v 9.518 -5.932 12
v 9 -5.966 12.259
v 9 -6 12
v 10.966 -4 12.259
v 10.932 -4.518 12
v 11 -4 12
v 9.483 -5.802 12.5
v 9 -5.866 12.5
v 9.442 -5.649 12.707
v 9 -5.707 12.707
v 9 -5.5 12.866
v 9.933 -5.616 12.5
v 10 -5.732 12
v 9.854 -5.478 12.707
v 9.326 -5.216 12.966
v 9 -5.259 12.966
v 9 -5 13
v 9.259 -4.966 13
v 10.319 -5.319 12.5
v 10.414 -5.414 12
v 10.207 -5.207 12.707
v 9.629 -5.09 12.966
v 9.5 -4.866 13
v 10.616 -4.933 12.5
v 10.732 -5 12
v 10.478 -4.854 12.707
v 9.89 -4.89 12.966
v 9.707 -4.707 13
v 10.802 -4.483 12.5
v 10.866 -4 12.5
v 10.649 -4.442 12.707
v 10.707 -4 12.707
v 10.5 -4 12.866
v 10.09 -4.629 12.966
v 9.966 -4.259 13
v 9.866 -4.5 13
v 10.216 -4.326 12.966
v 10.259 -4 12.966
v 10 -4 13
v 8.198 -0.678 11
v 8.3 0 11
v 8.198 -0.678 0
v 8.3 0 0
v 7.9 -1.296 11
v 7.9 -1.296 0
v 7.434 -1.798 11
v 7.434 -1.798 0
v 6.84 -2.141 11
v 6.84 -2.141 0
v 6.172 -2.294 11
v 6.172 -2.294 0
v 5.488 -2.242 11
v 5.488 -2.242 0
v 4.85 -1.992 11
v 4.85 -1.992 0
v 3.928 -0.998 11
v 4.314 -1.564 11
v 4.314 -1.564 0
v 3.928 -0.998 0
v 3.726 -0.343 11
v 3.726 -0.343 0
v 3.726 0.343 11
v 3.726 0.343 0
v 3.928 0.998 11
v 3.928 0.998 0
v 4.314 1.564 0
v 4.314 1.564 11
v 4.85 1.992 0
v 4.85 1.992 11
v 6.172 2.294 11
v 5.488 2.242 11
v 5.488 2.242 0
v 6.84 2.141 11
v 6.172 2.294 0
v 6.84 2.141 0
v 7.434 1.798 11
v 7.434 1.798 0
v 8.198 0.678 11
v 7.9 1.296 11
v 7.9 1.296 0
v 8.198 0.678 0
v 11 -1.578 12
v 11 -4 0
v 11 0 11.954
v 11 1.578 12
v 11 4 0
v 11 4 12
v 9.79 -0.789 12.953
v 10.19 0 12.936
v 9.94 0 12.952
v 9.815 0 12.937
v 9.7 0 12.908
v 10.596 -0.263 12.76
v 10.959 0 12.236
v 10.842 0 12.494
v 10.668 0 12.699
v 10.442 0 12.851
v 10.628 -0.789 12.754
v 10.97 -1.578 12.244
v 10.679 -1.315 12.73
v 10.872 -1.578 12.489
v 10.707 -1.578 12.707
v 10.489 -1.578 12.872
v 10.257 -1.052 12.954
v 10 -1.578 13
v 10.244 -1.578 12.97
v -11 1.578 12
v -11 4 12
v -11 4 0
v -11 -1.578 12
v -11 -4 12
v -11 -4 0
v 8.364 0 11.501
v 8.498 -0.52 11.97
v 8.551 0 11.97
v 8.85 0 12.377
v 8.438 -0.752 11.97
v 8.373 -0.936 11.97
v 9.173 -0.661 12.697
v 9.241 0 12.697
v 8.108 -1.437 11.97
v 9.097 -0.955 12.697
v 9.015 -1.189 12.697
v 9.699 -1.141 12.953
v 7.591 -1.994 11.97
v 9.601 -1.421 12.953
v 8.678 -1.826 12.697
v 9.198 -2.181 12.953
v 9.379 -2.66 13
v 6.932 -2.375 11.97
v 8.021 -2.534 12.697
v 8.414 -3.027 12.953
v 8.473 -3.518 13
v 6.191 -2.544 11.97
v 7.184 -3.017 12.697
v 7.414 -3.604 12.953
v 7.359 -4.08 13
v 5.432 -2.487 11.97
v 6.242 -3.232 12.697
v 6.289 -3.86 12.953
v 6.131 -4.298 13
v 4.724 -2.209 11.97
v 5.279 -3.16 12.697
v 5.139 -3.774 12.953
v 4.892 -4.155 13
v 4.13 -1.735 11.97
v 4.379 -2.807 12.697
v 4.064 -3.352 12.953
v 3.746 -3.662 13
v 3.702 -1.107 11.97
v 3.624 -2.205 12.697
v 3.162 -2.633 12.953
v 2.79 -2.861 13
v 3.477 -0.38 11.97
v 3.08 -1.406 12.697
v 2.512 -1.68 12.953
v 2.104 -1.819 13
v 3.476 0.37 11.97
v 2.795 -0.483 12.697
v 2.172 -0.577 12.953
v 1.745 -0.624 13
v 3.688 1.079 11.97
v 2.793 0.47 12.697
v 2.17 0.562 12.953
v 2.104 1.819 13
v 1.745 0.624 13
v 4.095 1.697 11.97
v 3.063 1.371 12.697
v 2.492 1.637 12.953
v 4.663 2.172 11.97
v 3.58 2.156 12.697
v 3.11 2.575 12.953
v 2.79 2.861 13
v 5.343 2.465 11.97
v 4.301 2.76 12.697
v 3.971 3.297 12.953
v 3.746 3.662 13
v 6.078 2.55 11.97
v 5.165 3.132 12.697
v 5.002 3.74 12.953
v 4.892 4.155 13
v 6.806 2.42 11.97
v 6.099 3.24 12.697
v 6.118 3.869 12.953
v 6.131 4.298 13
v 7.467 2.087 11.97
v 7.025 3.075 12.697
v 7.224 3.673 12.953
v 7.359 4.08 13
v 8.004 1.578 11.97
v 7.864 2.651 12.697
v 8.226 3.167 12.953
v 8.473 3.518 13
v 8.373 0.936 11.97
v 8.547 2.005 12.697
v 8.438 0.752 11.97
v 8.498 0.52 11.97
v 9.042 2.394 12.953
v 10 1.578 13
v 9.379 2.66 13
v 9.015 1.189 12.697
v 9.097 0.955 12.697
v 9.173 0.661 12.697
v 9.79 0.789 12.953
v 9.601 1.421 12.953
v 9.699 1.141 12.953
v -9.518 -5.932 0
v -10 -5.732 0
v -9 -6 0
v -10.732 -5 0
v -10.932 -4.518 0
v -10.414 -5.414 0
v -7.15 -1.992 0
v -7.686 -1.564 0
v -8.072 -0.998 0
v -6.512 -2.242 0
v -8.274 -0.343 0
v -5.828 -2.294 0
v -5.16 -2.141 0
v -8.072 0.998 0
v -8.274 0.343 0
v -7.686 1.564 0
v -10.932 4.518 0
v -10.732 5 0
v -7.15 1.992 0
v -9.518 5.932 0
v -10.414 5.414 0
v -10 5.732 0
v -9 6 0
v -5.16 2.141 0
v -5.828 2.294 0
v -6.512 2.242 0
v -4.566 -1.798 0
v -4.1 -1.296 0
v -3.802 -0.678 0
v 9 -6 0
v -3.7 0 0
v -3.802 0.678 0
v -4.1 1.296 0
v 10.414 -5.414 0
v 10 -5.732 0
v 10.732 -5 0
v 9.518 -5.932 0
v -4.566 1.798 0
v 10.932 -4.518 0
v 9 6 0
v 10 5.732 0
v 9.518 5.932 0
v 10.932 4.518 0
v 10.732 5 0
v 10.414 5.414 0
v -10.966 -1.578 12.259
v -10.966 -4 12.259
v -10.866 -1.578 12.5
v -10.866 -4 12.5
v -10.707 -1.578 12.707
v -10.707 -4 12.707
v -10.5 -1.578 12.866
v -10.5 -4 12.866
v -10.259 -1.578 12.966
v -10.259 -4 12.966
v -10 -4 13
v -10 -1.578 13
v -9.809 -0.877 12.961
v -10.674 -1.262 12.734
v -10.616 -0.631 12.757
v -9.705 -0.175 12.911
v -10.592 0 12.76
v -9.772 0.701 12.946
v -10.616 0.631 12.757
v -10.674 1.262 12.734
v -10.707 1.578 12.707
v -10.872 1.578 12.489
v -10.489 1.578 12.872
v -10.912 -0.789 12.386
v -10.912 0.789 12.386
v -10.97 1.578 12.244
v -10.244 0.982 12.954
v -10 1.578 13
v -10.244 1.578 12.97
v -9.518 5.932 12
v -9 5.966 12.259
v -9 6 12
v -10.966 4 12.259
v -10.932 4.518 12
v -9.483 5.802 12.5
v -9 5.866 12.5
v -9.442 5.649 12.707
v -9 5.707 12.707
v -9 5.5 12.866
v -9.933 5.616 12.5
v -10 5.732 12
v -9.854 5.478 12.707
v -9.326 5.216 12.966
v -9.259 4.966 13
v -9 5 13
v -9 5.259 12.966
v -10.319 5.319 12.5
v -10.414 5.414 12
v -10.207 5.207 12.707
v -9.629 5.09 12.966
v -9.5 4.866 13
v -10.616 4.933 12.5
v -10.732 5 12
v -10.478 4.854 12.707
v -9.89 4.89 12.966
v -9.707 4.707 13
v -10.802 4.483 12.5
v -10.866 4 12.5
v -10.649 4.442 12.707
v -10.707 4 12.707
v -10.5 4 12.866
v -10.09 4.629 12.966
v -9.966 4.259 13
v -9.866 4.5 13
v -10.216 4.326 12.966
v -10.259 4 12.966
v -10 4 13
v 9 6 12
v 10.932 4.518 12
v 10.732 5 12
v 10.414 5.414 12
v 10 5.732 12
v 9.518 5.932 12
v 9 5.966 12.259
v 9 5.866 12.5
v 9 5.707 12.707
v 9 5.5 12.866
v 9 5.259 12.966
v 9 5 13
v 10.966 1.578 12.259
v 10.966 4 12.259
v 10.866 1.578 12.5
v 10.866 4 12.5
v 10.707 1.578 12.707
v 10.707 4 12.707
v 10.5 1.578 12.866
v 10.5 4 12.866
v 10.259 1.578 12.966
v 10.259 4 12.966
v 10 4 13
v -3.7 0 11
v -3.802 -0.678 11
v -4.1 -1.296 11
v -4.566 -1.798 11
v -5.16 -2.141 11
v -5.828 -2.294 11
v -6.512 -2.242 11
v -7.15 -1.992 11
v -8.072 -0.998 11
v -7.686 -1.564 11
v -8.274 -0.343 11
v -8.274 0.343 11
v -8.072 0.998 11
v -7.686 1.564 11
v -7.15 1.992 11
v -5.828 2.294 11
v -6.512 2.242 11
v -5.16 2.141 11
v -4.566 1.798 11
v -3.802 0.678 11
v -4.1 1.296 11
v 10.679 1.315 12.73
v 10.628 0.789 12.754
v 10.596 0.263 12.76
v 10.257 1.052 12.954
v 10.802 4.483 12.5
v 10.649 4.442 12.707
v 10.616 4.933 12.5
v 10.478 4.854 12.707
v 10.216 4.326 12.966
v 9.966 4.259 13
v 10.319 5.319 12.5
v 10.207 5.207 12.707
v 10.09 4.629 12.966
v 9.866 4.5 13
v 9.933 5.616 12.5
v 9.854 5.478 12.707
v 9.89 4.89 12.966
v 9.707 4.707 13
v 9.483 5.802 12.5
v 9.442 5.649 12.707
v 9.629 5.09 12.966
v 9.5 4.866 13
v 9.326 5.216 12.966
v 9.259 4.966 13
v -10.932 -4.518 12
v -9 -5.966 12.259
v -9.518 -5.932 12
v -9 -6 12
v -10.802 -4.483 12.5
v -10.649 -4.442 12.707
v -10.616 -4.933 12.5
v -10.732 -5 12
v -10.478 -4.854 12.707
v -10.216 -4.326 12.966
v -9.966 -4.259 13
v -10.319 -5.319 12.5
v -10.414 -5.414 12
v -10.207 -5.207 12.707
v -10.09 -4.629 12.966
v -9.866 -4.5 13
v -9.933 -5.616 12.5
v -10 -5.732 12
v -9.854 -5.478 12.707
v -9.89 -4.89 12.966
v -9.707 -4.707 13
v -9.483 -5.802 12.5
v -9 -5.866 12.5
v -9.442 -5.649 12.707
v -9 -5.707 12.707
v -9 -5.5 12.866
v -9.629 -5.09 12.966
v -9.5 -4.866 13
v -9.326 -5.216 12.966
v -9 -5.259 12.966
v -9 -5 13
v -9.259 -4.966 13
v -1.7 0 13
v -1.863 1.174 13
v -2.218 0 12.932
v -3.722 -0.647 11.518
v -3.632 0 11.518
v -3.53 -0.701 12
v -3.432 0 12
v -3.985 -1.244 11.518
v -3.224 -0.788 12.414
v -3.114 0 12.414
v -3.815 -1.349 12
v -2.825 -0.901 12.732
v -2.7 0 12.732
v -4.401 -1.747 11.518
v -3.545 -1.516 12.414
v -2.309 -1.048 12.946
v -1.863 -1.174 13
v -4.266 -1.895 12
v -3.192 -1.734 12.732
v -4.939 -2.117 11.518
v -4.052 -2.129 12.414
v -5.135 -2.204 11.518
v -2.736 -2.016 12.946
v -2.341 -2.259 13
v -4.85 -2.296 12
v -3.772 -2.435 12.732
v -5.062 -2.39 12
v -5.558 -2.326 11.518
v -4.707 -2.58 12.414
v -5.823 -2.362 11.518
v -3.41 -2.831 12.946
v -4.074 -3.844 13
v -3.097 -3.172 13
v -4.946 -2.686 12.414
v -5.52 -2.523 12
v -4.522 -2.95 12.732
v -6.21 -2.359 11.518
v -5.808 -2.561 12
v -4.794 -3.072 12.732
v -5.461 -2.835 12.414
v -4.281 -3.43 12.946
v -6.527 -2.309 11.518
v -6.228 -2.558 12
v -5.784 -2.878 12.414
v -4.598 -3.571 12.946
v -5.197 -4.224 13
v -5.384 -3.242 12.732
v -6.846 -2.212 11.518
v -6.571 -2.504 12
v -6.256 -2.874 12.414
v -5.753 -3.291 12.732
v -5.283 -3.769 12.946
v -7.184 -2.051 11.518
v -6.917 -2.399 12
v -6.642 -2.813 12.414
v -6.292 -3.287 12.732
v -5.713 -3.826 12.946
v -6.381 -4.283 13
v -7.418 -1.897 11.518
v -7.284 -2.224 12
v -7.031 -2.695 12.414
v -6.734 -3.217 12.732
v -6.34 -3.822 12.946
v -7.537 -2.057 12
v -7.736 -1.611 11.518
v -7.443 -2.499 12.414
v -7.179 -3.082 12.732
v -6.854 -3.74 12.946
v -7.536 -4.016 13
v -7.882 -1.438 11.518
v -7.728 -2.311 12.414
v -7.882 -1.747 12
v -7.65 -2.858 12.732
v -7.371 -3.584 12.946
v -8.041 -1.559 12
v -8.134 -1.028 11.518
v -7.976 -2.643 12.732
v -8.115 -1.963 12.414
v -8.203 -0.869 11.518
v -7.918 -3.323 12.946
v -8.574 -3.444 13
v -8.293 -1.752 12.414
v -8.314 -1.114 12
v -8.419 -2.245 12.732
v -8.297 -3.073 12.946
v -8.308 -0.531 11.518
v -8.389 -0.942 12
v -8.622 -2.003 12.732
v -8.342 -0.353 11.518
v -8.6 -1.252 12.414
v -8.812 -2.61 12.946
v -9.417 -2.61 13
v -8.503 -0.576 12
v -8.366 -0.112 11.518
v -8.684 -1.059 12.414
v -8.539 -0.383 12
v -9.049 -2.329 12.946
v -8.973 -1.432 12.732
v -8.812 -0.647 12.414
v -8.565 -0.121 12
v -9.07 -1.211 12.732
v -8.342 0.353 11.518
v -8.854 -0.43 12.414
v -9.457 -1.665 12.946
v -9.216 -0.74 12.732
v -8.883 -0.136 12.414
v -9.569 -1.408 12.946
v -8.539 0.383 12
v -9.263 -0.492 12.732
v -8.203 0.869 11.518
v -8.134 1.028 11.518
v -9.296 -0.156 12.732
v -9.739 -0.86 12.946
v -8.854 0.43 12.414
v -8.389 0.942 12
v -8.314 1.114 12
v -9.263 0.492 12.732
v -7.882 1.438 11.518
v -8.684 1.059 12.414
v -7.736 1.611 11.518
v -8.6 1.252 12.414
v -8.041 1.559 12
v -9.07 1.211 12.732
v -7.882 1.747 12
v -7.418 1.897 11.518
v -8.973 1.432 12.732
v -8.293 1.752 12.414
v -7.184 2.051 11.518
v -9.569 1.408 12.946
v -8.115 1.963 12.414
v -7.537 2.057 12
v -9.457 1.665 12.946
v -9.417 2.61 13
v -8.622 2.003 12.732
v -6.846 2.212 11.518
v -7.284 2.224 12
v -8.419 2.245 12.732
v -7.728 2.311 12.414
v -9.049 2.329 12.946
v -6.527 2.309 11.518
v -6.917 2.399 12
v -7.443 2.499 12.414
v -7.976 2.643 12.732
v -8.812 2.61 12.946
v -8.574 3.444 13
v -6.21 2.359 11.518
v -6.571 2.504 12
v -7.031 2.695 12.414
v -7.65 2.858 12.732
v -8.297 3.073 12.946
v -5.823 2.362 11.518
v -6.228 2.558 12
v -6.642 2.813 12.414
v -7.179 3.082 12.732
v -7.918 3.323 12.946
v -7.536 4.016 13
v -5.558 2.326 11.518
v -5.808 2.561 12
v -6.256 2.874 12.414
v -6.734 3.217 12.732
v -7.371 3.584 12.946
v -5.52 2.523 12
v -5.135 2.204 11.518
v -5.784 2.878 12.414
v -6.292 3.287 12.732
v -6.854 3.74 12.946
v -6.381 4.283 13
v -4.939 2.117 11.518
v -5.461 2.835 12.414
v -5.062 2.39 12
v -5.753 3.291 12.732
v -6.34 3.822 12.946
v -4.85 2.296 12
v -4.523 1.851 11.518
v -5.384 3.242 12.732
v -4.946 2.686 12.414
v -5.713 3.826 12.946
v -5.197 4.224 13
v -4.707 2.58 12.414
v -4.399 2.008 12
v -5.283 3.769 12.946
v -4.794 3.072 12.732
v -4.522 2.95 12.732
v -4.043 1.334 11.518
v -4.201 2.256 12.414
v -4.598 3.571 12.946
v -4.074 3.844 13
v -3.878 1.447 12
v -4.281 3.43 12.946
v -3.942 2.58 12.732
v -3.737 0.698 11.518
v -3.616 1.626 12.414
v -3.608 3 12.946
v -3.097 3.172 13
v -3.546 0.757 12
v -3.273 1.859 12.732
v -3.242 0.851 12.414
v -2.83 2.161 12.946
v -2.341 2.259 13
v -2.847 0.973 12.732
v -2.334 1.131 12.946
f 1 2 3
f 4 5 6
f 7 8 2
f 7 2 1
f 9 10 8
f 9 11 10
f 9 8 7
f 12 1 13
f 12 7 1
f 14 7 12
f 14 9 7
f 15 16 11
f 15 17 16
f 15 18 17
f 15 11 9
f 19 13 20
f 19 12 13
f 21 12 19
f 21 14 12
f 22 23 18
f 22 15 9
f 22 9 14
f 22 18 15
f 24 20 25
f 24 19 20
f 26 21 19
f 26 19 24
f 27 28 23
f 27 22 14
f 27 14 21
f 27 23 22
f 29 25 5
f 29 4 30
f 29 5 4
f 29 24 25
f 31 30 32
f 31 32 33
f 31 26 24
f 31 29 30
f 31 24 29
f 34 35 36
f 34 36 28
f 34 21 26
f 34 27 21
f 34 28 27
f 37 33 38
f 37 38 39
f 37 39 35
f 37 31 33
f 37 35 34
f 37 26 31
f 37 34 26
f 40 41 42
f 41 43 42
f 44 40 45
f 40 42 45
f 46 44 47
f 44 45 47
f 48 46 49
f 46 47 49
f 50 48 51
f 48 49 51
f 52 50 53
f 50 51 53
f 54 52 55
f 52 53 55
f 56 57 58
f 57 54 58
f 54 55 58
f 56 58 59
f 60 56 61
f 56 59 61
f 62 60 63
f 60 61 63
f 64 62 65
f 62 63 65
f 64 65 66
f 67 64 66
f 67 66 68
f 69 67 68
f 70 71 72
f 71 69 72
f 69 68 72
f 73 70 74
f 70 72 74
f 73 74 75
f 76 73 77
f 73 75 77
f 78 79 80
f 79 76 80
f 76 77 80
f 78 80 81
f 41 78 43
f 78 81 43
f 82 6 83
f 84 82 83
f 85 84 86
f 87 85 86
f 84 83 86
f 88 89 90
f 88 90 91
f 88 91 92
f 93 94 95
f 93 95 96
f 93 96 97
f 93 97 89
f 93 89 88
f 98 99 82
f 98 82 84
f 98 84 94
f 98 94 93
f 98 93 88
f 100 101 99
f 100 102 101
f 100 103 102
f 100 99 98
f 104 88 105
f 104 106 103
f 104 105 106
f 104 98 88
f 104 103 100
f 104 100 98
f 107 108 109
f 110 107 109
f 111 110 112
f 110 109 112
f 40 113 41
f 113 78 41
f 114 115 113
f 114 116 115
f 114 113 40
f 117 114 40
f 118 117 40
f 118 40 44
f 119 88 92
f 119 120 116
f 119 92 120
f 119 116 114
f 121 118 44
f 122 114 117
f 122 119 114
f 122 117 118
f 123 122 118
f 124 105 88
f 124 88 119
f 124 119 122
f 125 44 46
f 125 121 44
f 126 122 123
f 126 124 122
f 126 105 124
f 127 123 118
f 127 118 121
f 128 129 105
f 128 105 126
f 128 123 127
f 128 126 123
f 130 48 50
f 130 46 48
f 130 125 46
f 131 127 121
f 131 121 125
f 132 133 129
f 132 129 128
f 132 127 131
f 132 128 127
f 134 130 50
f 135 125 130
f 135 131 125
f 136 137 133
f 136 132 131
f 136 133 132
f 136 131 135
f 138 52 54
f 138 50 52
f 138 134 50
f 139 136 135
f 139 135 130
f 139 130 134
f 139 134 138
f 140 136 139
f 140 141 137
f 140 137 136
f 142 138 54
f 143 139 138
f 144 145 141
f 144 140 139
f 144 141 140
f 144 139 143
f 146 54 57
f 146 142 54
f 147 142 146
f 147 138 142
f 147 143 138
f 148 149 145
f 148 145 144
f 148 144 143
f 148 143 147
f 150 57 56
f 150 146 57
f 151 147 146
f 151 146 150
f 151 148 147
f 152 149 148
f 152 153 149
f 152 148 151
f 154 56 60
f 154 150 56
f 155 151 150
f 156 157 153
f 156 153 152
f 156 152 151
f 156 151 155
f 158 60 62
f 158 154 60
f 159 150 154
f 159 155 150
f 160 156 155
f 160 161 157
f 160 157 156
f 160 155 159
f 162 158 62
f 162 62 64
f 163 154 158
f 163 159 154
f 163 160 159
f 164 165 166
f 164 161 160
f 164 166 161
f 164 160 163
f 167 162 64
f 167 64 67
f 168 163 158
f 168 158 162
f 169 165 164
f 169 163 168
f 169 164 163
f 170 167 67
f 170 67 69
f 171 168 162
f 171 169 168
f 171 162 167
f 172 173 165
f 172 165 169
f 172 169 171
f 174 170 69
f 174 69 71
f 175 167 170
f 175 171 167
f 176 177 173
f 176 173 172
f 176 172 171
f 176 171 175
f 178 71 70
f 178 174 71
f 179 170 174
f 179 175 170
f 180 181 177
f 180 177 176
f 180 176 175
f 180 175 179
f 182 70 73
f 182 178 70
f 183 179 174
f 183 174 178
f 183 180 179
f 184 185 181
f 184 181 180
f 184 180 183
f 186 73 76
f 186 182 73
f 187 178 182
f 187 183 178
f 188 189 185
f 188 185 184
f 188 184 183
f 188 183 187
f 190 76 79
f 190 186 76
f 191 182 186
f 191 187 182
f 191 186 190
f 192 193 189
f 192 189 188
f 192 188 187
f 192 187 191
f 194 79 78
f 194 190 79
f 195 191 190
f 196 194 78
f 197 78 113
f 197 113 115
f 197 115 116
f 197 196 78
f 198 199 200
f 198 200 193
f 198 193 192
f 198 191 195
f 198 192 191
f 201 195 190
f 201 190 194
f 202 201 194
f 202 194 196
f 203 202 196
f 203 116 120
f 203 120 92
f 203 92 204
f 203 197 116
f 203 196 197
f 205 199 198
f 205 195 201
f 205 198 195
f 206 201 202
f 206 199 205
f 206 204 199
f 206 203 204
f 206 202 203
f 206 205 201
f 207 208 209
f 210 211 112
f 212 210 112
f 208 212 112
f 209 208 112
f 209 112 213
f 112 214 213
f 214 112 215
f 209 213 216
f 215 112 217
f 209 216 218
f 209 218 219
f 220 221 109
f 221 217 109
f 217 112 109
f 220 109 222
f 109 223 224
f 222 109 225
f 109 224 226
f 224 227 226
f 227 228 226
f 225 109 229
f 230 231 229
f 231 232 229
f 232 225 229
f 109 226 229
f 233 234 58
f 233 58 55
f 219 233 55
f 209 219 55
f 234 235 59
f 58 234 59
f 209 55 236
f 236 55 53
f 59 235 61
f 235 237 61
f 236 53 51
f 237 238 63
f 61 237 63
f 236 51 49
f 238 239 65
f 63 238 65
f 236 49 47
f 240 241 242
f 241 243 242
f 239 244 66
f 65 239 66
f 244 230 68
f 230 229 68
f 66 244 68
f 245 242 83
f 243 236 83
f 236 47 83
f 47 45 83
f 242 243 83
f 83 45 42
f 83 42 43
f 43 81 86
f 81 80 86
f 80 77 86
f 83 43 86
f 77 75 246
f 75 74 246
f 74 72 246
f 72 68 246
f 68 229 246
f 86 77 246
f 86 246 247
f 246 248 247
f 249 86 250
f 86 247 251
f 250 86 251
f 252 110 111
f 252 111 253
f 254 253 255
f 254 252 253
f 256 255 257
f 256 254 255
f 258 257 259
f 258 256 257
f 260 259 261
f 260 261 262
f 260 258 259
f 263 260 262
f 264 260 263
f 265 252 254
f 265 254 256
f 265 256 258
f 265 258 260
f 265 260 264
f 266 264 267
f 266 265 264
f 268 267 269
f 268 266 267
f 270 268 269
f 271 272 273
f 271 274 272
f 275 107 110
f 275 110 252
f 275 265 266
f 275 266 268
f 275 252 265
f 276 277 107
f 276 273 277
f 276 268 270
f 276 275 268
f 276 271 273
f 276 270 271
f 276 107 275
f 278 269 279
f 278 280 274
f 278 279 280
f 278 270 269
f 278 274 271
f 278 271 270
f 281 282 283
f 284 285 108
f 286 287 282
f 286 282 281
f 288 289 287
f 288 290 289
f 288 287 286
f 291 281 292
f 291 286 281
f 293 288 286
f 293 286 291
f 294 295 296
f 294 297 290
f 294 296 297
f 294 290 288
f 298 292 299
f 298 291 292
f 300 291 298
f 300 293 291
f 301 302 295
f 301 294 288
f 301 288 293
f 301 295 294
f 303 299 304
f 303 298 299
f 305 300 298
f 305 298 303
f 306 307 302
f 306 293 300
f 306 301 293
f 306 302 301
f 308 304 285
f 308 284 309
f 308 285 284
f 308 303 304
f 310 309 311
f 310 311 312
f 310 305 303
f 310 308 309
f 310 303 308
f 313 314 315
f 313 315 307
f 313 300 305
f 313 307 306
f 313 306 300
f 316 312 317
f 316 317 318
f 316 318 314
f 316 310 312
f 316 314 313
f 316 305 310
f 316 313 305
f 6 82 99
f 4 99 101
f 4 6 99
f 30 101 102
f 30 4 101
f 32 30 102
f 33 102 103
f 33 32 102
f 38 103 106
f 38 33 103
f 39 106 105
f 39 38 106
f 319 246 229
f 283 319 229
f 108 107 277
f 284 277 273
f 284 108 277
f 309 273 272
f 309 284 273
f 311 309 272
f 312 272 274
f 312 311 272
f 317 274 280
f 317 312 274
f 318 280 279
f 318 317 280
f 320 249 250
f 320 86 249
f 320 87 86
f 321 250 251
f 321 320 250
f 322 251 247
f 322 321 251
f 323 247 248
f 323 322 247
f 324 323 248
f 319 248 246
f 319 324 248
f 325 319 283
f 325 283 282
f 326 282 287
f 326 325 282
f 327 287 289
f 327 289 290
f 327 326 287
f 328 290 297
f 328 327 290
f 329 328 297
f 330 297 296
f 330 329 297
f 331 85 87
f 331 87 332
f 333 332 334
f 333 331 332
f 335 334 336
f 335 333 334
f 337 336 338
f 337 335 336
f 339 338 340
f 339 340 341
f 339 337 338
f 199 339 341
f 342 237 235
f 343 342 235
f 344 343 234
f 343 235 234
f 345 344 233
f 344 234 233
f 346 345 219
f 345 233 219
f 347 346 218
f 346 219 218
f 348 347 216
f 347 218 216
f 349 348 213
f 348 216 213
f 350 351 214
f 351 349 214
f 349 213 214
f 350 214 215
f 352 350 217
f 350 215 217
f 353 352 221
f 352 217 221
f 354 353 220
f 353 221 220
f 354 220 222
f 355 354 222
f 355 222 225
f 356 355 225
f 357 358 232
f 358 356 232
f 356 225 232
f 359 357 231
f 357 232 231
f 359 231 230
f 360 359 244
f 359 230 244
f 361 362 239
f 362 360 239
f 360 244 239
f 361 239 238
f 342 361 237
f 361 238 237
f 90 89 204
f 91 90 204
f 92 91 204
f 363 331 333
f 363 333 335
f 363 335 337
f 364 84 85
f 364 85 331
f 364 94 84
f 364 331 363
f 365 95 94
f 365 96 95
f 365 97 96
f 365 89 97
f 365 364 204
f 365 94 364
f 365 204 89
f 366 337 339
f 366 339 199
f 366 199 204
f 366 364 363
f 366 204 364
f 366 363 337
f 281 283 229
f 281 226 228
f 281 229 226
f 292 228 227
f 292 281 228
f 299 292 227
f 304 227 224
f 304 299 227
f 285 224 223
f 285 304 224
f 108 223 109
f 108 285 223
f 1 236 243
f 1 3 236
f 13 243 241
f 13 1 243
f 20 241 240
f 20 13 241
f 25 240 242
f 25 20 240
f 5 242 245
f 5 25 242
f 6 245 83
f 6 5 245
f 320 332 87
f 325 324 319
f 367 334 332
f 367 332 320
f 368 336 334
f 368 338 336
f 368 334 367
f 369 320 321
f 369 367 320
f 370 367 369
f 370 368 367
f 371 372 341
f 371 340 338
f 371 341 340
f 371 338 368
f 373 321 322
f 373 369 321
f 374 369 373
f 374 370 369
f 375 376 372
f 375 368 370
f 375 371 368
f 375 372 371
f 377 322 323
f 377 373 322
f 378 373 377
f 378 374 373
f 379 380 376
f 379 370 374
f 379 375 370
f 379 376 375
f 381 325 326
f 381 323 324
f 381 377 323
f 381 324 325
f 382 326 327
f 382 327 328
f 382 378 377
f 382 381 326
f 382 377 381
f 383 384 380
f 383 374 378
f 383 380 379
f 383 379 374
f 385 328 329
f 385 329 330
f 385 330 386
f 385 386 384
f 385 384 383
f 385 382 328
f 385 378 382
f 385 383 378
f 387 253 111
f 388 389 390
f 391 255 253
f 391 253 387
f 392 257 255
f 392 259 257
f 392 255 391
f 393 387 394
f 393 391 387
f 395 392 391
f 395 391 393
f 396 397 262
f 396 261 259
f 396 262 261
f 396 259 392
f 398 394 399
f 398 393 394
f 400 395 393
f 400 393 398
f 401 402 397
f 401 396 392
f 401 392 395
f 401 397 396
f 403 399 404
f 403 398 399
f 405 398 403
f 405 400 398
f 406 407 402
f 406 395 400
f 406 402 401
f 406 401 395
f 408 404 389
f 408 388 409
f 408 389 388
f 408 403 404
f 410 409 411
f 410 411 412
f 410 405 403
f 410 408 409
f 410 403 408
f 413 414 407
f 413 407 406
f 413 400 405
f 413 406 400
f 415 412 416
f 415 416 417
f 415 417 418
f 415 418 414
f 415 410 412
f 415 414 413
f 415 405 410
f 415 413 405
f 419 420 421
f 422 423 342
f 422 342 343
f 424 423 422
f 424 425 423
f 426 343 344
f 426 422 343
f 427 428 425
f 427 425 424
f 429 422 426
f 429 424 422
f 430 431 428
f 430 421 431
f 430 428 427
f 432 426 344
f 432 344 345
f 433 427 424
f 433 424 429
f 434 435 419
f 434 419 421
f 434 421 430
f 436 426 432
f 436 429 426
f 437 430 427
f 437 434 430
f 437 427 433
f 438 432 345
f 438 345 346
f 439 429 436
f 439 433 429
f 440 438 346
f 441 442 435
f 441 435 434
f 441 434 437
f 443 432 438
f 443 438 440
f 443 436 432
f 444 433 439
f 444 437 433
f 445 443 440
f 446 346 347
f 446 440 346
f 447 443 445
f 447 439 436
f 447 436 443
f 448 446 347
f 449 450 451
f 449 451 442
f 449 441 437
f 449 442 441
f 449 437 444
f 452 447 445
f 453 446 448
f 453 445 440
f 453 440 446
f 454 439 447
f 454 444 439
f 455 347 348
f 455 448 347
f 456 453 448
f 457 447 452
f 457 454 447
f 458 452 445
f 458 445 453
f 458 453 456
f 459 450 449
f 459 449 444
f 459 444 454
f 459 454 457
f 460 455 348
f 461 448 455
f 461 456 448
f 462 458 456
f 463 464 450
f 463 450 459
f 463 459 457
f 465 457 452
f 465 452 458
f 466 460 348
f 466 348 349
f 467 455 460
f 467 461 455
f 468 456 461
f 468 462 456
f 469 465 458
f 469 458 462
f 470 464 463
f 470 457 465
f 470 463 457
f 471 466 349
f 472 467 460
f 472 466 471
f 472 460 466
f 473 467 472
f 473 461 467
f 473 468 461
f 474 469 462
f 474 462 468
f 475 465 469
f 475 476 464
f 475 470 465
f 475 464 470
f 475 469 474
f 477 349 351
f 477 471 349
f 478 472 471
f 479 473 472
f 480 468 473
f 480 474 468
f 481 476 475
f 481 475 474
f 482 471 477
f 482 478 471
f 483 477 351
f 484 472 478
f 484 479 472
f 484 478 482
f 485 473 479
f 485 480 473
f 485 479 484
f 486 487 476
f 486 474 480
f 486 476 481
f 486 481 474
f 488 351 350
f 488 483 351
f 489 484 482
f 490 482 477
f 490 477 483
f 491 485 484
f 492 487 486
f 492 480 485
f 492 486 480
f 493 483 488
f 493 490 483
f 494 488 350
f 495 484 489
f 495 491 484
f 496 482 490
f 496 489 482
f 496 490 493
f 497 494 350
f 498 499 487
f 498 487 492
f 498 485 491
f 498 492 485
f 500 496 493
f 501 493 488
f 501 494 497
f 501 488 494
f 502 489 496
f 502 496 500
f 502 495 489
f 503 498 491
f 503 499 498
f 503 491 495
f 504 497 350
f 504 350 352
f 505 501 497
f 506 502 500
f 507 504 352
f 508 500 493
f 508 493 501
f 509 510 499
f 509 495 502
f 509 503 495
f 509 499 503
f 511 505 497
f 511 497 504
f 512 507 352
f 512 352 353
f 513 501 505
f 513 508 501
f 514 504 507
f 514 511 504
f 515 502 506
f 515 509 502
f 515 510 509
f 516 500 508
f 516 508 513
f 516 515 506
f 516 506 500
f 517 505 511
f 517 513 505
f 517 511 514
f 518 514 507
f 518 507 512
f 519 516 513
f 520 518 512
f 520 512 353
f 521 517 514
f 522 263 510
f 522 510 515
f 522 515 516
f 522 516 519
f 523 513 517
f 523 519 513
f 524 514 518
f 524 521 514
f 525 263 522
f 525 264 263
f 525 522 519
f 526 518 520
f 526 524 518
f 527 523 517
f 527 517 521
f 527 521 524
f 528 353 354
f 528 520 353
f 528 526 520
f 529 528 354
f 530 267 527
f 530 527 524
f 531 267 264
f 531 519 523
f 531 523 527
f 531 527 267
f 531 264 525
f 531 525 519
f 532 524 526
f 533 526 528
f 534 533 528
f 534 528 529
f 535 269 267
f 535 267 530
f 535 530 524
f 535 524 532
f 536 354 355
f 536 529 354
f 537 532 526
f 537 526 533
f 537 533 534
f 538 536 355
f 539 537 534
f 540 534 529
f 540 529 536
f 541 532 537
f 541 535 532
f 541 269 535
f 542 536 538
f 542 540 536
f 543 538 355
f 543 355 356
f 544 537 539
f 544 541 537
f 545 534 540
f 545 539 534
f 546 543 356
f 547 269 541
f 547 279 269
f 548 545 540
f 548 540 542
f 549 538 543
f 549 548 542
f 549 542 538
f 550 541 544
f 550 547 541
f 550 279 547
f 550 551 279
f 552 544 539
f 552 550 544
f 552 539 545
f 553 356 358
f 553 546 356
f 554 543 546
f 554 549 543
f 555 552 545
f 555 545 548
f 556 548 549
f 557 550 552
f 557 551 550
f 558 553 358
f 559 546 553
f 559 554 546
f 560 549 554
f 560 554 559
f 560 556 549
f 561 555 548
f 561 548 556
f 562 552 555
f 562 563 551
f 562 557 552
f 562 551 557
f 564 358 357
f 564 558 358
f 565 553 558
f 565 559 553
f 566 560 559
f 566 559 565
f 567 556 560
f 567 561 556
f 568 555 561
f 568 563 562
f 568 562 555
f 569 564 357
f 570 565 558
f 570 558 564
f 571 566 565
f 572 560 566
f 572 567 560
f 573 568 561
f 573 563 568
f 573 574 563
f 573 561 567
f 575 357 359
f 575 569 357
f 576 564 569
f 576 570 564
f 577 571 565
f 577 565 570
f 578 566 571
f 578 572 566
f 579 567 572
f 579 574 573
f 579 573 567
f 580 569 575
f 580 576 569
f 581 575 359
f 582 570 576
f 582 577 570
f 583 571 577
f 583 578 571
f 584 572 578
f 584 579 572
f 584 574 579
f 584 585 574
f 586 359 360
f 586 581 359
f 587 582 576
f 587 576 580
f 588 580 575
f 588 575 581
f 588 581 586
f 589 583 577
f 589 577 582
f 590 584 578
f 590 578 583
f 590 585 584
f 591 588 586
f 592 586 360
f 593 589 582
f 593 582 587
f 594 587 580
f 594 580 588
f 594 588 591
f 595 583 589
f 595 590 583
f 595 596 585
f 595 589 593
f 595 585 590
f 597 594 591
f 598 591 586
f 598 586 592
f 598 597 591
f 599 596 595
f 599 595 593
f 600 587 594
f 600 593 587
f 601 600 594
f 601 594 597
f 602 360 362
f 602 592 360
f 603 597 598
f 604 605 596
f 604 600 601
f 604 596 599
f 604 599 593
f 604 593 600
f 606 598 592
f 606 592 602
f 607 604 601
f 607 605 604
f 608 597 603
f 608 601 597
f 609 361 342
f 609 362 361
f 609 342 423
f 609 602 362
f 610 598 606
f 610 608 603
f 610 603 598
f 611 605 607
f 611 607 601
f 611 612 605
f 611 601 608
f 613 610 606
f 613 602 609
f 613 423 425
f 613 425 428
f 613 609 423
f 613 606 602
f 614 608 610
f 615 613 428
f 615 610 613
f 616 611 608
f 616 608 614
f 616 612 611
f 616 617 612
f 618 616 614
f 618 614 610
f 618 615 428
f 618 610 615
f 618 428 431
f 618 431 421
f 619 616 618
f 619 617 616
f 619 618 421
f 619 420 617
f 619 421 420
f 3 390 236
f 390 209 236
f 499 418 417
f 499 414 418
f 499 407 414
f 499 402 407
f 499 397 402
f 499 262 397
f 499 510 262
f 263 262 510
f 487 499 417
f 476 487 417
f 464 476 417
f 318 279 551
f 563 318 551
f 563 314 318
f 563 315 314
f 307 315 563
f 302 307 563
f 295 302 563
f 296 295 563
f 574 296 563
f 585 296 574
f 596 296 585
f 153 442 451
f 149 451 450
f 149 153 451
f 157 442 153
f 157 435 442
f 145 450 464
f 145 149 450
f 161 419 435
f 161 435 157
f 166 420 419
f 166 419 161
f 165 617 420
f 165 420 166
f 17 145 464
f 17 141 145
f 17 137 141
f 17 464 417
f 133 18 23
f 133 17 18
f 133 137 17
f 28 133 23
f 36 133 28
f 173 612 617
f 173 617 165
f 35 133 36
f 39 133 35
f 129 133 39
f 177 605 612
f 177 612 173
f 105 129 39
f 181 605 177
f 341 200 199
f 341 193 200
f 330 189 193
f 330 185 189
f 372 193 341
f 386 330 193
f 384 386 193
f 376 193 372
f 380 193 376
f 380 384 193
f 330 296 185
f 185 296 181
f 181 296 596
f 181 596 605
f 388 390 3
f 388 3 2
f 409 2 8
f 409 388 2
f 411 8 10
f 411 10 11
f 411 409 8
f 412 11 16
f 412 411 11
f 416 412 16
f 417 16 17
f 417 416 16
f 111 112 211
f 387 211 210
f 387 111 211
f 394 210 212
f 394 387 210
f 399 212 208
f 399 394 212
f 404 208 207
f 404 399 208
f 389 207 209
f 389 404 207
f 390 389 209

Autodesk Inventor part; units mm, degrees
ref_plane "YZ Plane" through (0, 0, 0) normal (1, 0, 0) x (0, 1, 0)
ref_plane "XZ Plane" through (0, 0, 0) normal (0, 1, 0) x (-1, 0, 0)
ref_plane "XY Plane" through (0, 0, 0) normal (0, 0, 1) x (1, 0, 0)
sketch "Sketch1" plane through (0, 0, 0) normal (0, 0, 1) x (1, 0, 0)
  line L0 (-11, -6) -> (11, -6)
  line L1 (11, -6) -> (11, 6)
  line L2 (11, 6) -> (-11, 6)
  line L3 (-11, 6) -> (-11, -6)
  line L4 (-11, -6) -> (11, 6) construction
  line L5 (11, -6) -> (-11, 6) construction
  circle A0 centre (-6, 0) radius 2.3
  circle A1 centre (6, 0) radius 2.3
  line L6 (-6, 0) -> (0, 0) construction
  line L7 (0, 0) -> (6, 0) construction
  dimension "d0" = 12
  dimension "d1" = 4.6
  dimension "d2" = 12
  dimension "d3" = 5
extrude "Extrusion1" add sketch "Sketch1" along normal blind 13
fillet "Fillet1" radius 2 6 edges at (11, 6, 6.5) (11, -6, 6.5) (-11, 6, 6.5) (-11, -6, 6.5) (-8.3, 0, 13) (3.7, 0, 13)
fillet "Fillet2" radius 1 8 edges at (-10.4142, 5.4142, 13) (-11, 0, 13) (-10.4142, -5.4142, 13) (0, -6, 13) (10.4142, -5.4142, 13) (11, 0, 13) (10.4142, 5.4142, 13) (0, 6, 13)
properties part number "spacer"
